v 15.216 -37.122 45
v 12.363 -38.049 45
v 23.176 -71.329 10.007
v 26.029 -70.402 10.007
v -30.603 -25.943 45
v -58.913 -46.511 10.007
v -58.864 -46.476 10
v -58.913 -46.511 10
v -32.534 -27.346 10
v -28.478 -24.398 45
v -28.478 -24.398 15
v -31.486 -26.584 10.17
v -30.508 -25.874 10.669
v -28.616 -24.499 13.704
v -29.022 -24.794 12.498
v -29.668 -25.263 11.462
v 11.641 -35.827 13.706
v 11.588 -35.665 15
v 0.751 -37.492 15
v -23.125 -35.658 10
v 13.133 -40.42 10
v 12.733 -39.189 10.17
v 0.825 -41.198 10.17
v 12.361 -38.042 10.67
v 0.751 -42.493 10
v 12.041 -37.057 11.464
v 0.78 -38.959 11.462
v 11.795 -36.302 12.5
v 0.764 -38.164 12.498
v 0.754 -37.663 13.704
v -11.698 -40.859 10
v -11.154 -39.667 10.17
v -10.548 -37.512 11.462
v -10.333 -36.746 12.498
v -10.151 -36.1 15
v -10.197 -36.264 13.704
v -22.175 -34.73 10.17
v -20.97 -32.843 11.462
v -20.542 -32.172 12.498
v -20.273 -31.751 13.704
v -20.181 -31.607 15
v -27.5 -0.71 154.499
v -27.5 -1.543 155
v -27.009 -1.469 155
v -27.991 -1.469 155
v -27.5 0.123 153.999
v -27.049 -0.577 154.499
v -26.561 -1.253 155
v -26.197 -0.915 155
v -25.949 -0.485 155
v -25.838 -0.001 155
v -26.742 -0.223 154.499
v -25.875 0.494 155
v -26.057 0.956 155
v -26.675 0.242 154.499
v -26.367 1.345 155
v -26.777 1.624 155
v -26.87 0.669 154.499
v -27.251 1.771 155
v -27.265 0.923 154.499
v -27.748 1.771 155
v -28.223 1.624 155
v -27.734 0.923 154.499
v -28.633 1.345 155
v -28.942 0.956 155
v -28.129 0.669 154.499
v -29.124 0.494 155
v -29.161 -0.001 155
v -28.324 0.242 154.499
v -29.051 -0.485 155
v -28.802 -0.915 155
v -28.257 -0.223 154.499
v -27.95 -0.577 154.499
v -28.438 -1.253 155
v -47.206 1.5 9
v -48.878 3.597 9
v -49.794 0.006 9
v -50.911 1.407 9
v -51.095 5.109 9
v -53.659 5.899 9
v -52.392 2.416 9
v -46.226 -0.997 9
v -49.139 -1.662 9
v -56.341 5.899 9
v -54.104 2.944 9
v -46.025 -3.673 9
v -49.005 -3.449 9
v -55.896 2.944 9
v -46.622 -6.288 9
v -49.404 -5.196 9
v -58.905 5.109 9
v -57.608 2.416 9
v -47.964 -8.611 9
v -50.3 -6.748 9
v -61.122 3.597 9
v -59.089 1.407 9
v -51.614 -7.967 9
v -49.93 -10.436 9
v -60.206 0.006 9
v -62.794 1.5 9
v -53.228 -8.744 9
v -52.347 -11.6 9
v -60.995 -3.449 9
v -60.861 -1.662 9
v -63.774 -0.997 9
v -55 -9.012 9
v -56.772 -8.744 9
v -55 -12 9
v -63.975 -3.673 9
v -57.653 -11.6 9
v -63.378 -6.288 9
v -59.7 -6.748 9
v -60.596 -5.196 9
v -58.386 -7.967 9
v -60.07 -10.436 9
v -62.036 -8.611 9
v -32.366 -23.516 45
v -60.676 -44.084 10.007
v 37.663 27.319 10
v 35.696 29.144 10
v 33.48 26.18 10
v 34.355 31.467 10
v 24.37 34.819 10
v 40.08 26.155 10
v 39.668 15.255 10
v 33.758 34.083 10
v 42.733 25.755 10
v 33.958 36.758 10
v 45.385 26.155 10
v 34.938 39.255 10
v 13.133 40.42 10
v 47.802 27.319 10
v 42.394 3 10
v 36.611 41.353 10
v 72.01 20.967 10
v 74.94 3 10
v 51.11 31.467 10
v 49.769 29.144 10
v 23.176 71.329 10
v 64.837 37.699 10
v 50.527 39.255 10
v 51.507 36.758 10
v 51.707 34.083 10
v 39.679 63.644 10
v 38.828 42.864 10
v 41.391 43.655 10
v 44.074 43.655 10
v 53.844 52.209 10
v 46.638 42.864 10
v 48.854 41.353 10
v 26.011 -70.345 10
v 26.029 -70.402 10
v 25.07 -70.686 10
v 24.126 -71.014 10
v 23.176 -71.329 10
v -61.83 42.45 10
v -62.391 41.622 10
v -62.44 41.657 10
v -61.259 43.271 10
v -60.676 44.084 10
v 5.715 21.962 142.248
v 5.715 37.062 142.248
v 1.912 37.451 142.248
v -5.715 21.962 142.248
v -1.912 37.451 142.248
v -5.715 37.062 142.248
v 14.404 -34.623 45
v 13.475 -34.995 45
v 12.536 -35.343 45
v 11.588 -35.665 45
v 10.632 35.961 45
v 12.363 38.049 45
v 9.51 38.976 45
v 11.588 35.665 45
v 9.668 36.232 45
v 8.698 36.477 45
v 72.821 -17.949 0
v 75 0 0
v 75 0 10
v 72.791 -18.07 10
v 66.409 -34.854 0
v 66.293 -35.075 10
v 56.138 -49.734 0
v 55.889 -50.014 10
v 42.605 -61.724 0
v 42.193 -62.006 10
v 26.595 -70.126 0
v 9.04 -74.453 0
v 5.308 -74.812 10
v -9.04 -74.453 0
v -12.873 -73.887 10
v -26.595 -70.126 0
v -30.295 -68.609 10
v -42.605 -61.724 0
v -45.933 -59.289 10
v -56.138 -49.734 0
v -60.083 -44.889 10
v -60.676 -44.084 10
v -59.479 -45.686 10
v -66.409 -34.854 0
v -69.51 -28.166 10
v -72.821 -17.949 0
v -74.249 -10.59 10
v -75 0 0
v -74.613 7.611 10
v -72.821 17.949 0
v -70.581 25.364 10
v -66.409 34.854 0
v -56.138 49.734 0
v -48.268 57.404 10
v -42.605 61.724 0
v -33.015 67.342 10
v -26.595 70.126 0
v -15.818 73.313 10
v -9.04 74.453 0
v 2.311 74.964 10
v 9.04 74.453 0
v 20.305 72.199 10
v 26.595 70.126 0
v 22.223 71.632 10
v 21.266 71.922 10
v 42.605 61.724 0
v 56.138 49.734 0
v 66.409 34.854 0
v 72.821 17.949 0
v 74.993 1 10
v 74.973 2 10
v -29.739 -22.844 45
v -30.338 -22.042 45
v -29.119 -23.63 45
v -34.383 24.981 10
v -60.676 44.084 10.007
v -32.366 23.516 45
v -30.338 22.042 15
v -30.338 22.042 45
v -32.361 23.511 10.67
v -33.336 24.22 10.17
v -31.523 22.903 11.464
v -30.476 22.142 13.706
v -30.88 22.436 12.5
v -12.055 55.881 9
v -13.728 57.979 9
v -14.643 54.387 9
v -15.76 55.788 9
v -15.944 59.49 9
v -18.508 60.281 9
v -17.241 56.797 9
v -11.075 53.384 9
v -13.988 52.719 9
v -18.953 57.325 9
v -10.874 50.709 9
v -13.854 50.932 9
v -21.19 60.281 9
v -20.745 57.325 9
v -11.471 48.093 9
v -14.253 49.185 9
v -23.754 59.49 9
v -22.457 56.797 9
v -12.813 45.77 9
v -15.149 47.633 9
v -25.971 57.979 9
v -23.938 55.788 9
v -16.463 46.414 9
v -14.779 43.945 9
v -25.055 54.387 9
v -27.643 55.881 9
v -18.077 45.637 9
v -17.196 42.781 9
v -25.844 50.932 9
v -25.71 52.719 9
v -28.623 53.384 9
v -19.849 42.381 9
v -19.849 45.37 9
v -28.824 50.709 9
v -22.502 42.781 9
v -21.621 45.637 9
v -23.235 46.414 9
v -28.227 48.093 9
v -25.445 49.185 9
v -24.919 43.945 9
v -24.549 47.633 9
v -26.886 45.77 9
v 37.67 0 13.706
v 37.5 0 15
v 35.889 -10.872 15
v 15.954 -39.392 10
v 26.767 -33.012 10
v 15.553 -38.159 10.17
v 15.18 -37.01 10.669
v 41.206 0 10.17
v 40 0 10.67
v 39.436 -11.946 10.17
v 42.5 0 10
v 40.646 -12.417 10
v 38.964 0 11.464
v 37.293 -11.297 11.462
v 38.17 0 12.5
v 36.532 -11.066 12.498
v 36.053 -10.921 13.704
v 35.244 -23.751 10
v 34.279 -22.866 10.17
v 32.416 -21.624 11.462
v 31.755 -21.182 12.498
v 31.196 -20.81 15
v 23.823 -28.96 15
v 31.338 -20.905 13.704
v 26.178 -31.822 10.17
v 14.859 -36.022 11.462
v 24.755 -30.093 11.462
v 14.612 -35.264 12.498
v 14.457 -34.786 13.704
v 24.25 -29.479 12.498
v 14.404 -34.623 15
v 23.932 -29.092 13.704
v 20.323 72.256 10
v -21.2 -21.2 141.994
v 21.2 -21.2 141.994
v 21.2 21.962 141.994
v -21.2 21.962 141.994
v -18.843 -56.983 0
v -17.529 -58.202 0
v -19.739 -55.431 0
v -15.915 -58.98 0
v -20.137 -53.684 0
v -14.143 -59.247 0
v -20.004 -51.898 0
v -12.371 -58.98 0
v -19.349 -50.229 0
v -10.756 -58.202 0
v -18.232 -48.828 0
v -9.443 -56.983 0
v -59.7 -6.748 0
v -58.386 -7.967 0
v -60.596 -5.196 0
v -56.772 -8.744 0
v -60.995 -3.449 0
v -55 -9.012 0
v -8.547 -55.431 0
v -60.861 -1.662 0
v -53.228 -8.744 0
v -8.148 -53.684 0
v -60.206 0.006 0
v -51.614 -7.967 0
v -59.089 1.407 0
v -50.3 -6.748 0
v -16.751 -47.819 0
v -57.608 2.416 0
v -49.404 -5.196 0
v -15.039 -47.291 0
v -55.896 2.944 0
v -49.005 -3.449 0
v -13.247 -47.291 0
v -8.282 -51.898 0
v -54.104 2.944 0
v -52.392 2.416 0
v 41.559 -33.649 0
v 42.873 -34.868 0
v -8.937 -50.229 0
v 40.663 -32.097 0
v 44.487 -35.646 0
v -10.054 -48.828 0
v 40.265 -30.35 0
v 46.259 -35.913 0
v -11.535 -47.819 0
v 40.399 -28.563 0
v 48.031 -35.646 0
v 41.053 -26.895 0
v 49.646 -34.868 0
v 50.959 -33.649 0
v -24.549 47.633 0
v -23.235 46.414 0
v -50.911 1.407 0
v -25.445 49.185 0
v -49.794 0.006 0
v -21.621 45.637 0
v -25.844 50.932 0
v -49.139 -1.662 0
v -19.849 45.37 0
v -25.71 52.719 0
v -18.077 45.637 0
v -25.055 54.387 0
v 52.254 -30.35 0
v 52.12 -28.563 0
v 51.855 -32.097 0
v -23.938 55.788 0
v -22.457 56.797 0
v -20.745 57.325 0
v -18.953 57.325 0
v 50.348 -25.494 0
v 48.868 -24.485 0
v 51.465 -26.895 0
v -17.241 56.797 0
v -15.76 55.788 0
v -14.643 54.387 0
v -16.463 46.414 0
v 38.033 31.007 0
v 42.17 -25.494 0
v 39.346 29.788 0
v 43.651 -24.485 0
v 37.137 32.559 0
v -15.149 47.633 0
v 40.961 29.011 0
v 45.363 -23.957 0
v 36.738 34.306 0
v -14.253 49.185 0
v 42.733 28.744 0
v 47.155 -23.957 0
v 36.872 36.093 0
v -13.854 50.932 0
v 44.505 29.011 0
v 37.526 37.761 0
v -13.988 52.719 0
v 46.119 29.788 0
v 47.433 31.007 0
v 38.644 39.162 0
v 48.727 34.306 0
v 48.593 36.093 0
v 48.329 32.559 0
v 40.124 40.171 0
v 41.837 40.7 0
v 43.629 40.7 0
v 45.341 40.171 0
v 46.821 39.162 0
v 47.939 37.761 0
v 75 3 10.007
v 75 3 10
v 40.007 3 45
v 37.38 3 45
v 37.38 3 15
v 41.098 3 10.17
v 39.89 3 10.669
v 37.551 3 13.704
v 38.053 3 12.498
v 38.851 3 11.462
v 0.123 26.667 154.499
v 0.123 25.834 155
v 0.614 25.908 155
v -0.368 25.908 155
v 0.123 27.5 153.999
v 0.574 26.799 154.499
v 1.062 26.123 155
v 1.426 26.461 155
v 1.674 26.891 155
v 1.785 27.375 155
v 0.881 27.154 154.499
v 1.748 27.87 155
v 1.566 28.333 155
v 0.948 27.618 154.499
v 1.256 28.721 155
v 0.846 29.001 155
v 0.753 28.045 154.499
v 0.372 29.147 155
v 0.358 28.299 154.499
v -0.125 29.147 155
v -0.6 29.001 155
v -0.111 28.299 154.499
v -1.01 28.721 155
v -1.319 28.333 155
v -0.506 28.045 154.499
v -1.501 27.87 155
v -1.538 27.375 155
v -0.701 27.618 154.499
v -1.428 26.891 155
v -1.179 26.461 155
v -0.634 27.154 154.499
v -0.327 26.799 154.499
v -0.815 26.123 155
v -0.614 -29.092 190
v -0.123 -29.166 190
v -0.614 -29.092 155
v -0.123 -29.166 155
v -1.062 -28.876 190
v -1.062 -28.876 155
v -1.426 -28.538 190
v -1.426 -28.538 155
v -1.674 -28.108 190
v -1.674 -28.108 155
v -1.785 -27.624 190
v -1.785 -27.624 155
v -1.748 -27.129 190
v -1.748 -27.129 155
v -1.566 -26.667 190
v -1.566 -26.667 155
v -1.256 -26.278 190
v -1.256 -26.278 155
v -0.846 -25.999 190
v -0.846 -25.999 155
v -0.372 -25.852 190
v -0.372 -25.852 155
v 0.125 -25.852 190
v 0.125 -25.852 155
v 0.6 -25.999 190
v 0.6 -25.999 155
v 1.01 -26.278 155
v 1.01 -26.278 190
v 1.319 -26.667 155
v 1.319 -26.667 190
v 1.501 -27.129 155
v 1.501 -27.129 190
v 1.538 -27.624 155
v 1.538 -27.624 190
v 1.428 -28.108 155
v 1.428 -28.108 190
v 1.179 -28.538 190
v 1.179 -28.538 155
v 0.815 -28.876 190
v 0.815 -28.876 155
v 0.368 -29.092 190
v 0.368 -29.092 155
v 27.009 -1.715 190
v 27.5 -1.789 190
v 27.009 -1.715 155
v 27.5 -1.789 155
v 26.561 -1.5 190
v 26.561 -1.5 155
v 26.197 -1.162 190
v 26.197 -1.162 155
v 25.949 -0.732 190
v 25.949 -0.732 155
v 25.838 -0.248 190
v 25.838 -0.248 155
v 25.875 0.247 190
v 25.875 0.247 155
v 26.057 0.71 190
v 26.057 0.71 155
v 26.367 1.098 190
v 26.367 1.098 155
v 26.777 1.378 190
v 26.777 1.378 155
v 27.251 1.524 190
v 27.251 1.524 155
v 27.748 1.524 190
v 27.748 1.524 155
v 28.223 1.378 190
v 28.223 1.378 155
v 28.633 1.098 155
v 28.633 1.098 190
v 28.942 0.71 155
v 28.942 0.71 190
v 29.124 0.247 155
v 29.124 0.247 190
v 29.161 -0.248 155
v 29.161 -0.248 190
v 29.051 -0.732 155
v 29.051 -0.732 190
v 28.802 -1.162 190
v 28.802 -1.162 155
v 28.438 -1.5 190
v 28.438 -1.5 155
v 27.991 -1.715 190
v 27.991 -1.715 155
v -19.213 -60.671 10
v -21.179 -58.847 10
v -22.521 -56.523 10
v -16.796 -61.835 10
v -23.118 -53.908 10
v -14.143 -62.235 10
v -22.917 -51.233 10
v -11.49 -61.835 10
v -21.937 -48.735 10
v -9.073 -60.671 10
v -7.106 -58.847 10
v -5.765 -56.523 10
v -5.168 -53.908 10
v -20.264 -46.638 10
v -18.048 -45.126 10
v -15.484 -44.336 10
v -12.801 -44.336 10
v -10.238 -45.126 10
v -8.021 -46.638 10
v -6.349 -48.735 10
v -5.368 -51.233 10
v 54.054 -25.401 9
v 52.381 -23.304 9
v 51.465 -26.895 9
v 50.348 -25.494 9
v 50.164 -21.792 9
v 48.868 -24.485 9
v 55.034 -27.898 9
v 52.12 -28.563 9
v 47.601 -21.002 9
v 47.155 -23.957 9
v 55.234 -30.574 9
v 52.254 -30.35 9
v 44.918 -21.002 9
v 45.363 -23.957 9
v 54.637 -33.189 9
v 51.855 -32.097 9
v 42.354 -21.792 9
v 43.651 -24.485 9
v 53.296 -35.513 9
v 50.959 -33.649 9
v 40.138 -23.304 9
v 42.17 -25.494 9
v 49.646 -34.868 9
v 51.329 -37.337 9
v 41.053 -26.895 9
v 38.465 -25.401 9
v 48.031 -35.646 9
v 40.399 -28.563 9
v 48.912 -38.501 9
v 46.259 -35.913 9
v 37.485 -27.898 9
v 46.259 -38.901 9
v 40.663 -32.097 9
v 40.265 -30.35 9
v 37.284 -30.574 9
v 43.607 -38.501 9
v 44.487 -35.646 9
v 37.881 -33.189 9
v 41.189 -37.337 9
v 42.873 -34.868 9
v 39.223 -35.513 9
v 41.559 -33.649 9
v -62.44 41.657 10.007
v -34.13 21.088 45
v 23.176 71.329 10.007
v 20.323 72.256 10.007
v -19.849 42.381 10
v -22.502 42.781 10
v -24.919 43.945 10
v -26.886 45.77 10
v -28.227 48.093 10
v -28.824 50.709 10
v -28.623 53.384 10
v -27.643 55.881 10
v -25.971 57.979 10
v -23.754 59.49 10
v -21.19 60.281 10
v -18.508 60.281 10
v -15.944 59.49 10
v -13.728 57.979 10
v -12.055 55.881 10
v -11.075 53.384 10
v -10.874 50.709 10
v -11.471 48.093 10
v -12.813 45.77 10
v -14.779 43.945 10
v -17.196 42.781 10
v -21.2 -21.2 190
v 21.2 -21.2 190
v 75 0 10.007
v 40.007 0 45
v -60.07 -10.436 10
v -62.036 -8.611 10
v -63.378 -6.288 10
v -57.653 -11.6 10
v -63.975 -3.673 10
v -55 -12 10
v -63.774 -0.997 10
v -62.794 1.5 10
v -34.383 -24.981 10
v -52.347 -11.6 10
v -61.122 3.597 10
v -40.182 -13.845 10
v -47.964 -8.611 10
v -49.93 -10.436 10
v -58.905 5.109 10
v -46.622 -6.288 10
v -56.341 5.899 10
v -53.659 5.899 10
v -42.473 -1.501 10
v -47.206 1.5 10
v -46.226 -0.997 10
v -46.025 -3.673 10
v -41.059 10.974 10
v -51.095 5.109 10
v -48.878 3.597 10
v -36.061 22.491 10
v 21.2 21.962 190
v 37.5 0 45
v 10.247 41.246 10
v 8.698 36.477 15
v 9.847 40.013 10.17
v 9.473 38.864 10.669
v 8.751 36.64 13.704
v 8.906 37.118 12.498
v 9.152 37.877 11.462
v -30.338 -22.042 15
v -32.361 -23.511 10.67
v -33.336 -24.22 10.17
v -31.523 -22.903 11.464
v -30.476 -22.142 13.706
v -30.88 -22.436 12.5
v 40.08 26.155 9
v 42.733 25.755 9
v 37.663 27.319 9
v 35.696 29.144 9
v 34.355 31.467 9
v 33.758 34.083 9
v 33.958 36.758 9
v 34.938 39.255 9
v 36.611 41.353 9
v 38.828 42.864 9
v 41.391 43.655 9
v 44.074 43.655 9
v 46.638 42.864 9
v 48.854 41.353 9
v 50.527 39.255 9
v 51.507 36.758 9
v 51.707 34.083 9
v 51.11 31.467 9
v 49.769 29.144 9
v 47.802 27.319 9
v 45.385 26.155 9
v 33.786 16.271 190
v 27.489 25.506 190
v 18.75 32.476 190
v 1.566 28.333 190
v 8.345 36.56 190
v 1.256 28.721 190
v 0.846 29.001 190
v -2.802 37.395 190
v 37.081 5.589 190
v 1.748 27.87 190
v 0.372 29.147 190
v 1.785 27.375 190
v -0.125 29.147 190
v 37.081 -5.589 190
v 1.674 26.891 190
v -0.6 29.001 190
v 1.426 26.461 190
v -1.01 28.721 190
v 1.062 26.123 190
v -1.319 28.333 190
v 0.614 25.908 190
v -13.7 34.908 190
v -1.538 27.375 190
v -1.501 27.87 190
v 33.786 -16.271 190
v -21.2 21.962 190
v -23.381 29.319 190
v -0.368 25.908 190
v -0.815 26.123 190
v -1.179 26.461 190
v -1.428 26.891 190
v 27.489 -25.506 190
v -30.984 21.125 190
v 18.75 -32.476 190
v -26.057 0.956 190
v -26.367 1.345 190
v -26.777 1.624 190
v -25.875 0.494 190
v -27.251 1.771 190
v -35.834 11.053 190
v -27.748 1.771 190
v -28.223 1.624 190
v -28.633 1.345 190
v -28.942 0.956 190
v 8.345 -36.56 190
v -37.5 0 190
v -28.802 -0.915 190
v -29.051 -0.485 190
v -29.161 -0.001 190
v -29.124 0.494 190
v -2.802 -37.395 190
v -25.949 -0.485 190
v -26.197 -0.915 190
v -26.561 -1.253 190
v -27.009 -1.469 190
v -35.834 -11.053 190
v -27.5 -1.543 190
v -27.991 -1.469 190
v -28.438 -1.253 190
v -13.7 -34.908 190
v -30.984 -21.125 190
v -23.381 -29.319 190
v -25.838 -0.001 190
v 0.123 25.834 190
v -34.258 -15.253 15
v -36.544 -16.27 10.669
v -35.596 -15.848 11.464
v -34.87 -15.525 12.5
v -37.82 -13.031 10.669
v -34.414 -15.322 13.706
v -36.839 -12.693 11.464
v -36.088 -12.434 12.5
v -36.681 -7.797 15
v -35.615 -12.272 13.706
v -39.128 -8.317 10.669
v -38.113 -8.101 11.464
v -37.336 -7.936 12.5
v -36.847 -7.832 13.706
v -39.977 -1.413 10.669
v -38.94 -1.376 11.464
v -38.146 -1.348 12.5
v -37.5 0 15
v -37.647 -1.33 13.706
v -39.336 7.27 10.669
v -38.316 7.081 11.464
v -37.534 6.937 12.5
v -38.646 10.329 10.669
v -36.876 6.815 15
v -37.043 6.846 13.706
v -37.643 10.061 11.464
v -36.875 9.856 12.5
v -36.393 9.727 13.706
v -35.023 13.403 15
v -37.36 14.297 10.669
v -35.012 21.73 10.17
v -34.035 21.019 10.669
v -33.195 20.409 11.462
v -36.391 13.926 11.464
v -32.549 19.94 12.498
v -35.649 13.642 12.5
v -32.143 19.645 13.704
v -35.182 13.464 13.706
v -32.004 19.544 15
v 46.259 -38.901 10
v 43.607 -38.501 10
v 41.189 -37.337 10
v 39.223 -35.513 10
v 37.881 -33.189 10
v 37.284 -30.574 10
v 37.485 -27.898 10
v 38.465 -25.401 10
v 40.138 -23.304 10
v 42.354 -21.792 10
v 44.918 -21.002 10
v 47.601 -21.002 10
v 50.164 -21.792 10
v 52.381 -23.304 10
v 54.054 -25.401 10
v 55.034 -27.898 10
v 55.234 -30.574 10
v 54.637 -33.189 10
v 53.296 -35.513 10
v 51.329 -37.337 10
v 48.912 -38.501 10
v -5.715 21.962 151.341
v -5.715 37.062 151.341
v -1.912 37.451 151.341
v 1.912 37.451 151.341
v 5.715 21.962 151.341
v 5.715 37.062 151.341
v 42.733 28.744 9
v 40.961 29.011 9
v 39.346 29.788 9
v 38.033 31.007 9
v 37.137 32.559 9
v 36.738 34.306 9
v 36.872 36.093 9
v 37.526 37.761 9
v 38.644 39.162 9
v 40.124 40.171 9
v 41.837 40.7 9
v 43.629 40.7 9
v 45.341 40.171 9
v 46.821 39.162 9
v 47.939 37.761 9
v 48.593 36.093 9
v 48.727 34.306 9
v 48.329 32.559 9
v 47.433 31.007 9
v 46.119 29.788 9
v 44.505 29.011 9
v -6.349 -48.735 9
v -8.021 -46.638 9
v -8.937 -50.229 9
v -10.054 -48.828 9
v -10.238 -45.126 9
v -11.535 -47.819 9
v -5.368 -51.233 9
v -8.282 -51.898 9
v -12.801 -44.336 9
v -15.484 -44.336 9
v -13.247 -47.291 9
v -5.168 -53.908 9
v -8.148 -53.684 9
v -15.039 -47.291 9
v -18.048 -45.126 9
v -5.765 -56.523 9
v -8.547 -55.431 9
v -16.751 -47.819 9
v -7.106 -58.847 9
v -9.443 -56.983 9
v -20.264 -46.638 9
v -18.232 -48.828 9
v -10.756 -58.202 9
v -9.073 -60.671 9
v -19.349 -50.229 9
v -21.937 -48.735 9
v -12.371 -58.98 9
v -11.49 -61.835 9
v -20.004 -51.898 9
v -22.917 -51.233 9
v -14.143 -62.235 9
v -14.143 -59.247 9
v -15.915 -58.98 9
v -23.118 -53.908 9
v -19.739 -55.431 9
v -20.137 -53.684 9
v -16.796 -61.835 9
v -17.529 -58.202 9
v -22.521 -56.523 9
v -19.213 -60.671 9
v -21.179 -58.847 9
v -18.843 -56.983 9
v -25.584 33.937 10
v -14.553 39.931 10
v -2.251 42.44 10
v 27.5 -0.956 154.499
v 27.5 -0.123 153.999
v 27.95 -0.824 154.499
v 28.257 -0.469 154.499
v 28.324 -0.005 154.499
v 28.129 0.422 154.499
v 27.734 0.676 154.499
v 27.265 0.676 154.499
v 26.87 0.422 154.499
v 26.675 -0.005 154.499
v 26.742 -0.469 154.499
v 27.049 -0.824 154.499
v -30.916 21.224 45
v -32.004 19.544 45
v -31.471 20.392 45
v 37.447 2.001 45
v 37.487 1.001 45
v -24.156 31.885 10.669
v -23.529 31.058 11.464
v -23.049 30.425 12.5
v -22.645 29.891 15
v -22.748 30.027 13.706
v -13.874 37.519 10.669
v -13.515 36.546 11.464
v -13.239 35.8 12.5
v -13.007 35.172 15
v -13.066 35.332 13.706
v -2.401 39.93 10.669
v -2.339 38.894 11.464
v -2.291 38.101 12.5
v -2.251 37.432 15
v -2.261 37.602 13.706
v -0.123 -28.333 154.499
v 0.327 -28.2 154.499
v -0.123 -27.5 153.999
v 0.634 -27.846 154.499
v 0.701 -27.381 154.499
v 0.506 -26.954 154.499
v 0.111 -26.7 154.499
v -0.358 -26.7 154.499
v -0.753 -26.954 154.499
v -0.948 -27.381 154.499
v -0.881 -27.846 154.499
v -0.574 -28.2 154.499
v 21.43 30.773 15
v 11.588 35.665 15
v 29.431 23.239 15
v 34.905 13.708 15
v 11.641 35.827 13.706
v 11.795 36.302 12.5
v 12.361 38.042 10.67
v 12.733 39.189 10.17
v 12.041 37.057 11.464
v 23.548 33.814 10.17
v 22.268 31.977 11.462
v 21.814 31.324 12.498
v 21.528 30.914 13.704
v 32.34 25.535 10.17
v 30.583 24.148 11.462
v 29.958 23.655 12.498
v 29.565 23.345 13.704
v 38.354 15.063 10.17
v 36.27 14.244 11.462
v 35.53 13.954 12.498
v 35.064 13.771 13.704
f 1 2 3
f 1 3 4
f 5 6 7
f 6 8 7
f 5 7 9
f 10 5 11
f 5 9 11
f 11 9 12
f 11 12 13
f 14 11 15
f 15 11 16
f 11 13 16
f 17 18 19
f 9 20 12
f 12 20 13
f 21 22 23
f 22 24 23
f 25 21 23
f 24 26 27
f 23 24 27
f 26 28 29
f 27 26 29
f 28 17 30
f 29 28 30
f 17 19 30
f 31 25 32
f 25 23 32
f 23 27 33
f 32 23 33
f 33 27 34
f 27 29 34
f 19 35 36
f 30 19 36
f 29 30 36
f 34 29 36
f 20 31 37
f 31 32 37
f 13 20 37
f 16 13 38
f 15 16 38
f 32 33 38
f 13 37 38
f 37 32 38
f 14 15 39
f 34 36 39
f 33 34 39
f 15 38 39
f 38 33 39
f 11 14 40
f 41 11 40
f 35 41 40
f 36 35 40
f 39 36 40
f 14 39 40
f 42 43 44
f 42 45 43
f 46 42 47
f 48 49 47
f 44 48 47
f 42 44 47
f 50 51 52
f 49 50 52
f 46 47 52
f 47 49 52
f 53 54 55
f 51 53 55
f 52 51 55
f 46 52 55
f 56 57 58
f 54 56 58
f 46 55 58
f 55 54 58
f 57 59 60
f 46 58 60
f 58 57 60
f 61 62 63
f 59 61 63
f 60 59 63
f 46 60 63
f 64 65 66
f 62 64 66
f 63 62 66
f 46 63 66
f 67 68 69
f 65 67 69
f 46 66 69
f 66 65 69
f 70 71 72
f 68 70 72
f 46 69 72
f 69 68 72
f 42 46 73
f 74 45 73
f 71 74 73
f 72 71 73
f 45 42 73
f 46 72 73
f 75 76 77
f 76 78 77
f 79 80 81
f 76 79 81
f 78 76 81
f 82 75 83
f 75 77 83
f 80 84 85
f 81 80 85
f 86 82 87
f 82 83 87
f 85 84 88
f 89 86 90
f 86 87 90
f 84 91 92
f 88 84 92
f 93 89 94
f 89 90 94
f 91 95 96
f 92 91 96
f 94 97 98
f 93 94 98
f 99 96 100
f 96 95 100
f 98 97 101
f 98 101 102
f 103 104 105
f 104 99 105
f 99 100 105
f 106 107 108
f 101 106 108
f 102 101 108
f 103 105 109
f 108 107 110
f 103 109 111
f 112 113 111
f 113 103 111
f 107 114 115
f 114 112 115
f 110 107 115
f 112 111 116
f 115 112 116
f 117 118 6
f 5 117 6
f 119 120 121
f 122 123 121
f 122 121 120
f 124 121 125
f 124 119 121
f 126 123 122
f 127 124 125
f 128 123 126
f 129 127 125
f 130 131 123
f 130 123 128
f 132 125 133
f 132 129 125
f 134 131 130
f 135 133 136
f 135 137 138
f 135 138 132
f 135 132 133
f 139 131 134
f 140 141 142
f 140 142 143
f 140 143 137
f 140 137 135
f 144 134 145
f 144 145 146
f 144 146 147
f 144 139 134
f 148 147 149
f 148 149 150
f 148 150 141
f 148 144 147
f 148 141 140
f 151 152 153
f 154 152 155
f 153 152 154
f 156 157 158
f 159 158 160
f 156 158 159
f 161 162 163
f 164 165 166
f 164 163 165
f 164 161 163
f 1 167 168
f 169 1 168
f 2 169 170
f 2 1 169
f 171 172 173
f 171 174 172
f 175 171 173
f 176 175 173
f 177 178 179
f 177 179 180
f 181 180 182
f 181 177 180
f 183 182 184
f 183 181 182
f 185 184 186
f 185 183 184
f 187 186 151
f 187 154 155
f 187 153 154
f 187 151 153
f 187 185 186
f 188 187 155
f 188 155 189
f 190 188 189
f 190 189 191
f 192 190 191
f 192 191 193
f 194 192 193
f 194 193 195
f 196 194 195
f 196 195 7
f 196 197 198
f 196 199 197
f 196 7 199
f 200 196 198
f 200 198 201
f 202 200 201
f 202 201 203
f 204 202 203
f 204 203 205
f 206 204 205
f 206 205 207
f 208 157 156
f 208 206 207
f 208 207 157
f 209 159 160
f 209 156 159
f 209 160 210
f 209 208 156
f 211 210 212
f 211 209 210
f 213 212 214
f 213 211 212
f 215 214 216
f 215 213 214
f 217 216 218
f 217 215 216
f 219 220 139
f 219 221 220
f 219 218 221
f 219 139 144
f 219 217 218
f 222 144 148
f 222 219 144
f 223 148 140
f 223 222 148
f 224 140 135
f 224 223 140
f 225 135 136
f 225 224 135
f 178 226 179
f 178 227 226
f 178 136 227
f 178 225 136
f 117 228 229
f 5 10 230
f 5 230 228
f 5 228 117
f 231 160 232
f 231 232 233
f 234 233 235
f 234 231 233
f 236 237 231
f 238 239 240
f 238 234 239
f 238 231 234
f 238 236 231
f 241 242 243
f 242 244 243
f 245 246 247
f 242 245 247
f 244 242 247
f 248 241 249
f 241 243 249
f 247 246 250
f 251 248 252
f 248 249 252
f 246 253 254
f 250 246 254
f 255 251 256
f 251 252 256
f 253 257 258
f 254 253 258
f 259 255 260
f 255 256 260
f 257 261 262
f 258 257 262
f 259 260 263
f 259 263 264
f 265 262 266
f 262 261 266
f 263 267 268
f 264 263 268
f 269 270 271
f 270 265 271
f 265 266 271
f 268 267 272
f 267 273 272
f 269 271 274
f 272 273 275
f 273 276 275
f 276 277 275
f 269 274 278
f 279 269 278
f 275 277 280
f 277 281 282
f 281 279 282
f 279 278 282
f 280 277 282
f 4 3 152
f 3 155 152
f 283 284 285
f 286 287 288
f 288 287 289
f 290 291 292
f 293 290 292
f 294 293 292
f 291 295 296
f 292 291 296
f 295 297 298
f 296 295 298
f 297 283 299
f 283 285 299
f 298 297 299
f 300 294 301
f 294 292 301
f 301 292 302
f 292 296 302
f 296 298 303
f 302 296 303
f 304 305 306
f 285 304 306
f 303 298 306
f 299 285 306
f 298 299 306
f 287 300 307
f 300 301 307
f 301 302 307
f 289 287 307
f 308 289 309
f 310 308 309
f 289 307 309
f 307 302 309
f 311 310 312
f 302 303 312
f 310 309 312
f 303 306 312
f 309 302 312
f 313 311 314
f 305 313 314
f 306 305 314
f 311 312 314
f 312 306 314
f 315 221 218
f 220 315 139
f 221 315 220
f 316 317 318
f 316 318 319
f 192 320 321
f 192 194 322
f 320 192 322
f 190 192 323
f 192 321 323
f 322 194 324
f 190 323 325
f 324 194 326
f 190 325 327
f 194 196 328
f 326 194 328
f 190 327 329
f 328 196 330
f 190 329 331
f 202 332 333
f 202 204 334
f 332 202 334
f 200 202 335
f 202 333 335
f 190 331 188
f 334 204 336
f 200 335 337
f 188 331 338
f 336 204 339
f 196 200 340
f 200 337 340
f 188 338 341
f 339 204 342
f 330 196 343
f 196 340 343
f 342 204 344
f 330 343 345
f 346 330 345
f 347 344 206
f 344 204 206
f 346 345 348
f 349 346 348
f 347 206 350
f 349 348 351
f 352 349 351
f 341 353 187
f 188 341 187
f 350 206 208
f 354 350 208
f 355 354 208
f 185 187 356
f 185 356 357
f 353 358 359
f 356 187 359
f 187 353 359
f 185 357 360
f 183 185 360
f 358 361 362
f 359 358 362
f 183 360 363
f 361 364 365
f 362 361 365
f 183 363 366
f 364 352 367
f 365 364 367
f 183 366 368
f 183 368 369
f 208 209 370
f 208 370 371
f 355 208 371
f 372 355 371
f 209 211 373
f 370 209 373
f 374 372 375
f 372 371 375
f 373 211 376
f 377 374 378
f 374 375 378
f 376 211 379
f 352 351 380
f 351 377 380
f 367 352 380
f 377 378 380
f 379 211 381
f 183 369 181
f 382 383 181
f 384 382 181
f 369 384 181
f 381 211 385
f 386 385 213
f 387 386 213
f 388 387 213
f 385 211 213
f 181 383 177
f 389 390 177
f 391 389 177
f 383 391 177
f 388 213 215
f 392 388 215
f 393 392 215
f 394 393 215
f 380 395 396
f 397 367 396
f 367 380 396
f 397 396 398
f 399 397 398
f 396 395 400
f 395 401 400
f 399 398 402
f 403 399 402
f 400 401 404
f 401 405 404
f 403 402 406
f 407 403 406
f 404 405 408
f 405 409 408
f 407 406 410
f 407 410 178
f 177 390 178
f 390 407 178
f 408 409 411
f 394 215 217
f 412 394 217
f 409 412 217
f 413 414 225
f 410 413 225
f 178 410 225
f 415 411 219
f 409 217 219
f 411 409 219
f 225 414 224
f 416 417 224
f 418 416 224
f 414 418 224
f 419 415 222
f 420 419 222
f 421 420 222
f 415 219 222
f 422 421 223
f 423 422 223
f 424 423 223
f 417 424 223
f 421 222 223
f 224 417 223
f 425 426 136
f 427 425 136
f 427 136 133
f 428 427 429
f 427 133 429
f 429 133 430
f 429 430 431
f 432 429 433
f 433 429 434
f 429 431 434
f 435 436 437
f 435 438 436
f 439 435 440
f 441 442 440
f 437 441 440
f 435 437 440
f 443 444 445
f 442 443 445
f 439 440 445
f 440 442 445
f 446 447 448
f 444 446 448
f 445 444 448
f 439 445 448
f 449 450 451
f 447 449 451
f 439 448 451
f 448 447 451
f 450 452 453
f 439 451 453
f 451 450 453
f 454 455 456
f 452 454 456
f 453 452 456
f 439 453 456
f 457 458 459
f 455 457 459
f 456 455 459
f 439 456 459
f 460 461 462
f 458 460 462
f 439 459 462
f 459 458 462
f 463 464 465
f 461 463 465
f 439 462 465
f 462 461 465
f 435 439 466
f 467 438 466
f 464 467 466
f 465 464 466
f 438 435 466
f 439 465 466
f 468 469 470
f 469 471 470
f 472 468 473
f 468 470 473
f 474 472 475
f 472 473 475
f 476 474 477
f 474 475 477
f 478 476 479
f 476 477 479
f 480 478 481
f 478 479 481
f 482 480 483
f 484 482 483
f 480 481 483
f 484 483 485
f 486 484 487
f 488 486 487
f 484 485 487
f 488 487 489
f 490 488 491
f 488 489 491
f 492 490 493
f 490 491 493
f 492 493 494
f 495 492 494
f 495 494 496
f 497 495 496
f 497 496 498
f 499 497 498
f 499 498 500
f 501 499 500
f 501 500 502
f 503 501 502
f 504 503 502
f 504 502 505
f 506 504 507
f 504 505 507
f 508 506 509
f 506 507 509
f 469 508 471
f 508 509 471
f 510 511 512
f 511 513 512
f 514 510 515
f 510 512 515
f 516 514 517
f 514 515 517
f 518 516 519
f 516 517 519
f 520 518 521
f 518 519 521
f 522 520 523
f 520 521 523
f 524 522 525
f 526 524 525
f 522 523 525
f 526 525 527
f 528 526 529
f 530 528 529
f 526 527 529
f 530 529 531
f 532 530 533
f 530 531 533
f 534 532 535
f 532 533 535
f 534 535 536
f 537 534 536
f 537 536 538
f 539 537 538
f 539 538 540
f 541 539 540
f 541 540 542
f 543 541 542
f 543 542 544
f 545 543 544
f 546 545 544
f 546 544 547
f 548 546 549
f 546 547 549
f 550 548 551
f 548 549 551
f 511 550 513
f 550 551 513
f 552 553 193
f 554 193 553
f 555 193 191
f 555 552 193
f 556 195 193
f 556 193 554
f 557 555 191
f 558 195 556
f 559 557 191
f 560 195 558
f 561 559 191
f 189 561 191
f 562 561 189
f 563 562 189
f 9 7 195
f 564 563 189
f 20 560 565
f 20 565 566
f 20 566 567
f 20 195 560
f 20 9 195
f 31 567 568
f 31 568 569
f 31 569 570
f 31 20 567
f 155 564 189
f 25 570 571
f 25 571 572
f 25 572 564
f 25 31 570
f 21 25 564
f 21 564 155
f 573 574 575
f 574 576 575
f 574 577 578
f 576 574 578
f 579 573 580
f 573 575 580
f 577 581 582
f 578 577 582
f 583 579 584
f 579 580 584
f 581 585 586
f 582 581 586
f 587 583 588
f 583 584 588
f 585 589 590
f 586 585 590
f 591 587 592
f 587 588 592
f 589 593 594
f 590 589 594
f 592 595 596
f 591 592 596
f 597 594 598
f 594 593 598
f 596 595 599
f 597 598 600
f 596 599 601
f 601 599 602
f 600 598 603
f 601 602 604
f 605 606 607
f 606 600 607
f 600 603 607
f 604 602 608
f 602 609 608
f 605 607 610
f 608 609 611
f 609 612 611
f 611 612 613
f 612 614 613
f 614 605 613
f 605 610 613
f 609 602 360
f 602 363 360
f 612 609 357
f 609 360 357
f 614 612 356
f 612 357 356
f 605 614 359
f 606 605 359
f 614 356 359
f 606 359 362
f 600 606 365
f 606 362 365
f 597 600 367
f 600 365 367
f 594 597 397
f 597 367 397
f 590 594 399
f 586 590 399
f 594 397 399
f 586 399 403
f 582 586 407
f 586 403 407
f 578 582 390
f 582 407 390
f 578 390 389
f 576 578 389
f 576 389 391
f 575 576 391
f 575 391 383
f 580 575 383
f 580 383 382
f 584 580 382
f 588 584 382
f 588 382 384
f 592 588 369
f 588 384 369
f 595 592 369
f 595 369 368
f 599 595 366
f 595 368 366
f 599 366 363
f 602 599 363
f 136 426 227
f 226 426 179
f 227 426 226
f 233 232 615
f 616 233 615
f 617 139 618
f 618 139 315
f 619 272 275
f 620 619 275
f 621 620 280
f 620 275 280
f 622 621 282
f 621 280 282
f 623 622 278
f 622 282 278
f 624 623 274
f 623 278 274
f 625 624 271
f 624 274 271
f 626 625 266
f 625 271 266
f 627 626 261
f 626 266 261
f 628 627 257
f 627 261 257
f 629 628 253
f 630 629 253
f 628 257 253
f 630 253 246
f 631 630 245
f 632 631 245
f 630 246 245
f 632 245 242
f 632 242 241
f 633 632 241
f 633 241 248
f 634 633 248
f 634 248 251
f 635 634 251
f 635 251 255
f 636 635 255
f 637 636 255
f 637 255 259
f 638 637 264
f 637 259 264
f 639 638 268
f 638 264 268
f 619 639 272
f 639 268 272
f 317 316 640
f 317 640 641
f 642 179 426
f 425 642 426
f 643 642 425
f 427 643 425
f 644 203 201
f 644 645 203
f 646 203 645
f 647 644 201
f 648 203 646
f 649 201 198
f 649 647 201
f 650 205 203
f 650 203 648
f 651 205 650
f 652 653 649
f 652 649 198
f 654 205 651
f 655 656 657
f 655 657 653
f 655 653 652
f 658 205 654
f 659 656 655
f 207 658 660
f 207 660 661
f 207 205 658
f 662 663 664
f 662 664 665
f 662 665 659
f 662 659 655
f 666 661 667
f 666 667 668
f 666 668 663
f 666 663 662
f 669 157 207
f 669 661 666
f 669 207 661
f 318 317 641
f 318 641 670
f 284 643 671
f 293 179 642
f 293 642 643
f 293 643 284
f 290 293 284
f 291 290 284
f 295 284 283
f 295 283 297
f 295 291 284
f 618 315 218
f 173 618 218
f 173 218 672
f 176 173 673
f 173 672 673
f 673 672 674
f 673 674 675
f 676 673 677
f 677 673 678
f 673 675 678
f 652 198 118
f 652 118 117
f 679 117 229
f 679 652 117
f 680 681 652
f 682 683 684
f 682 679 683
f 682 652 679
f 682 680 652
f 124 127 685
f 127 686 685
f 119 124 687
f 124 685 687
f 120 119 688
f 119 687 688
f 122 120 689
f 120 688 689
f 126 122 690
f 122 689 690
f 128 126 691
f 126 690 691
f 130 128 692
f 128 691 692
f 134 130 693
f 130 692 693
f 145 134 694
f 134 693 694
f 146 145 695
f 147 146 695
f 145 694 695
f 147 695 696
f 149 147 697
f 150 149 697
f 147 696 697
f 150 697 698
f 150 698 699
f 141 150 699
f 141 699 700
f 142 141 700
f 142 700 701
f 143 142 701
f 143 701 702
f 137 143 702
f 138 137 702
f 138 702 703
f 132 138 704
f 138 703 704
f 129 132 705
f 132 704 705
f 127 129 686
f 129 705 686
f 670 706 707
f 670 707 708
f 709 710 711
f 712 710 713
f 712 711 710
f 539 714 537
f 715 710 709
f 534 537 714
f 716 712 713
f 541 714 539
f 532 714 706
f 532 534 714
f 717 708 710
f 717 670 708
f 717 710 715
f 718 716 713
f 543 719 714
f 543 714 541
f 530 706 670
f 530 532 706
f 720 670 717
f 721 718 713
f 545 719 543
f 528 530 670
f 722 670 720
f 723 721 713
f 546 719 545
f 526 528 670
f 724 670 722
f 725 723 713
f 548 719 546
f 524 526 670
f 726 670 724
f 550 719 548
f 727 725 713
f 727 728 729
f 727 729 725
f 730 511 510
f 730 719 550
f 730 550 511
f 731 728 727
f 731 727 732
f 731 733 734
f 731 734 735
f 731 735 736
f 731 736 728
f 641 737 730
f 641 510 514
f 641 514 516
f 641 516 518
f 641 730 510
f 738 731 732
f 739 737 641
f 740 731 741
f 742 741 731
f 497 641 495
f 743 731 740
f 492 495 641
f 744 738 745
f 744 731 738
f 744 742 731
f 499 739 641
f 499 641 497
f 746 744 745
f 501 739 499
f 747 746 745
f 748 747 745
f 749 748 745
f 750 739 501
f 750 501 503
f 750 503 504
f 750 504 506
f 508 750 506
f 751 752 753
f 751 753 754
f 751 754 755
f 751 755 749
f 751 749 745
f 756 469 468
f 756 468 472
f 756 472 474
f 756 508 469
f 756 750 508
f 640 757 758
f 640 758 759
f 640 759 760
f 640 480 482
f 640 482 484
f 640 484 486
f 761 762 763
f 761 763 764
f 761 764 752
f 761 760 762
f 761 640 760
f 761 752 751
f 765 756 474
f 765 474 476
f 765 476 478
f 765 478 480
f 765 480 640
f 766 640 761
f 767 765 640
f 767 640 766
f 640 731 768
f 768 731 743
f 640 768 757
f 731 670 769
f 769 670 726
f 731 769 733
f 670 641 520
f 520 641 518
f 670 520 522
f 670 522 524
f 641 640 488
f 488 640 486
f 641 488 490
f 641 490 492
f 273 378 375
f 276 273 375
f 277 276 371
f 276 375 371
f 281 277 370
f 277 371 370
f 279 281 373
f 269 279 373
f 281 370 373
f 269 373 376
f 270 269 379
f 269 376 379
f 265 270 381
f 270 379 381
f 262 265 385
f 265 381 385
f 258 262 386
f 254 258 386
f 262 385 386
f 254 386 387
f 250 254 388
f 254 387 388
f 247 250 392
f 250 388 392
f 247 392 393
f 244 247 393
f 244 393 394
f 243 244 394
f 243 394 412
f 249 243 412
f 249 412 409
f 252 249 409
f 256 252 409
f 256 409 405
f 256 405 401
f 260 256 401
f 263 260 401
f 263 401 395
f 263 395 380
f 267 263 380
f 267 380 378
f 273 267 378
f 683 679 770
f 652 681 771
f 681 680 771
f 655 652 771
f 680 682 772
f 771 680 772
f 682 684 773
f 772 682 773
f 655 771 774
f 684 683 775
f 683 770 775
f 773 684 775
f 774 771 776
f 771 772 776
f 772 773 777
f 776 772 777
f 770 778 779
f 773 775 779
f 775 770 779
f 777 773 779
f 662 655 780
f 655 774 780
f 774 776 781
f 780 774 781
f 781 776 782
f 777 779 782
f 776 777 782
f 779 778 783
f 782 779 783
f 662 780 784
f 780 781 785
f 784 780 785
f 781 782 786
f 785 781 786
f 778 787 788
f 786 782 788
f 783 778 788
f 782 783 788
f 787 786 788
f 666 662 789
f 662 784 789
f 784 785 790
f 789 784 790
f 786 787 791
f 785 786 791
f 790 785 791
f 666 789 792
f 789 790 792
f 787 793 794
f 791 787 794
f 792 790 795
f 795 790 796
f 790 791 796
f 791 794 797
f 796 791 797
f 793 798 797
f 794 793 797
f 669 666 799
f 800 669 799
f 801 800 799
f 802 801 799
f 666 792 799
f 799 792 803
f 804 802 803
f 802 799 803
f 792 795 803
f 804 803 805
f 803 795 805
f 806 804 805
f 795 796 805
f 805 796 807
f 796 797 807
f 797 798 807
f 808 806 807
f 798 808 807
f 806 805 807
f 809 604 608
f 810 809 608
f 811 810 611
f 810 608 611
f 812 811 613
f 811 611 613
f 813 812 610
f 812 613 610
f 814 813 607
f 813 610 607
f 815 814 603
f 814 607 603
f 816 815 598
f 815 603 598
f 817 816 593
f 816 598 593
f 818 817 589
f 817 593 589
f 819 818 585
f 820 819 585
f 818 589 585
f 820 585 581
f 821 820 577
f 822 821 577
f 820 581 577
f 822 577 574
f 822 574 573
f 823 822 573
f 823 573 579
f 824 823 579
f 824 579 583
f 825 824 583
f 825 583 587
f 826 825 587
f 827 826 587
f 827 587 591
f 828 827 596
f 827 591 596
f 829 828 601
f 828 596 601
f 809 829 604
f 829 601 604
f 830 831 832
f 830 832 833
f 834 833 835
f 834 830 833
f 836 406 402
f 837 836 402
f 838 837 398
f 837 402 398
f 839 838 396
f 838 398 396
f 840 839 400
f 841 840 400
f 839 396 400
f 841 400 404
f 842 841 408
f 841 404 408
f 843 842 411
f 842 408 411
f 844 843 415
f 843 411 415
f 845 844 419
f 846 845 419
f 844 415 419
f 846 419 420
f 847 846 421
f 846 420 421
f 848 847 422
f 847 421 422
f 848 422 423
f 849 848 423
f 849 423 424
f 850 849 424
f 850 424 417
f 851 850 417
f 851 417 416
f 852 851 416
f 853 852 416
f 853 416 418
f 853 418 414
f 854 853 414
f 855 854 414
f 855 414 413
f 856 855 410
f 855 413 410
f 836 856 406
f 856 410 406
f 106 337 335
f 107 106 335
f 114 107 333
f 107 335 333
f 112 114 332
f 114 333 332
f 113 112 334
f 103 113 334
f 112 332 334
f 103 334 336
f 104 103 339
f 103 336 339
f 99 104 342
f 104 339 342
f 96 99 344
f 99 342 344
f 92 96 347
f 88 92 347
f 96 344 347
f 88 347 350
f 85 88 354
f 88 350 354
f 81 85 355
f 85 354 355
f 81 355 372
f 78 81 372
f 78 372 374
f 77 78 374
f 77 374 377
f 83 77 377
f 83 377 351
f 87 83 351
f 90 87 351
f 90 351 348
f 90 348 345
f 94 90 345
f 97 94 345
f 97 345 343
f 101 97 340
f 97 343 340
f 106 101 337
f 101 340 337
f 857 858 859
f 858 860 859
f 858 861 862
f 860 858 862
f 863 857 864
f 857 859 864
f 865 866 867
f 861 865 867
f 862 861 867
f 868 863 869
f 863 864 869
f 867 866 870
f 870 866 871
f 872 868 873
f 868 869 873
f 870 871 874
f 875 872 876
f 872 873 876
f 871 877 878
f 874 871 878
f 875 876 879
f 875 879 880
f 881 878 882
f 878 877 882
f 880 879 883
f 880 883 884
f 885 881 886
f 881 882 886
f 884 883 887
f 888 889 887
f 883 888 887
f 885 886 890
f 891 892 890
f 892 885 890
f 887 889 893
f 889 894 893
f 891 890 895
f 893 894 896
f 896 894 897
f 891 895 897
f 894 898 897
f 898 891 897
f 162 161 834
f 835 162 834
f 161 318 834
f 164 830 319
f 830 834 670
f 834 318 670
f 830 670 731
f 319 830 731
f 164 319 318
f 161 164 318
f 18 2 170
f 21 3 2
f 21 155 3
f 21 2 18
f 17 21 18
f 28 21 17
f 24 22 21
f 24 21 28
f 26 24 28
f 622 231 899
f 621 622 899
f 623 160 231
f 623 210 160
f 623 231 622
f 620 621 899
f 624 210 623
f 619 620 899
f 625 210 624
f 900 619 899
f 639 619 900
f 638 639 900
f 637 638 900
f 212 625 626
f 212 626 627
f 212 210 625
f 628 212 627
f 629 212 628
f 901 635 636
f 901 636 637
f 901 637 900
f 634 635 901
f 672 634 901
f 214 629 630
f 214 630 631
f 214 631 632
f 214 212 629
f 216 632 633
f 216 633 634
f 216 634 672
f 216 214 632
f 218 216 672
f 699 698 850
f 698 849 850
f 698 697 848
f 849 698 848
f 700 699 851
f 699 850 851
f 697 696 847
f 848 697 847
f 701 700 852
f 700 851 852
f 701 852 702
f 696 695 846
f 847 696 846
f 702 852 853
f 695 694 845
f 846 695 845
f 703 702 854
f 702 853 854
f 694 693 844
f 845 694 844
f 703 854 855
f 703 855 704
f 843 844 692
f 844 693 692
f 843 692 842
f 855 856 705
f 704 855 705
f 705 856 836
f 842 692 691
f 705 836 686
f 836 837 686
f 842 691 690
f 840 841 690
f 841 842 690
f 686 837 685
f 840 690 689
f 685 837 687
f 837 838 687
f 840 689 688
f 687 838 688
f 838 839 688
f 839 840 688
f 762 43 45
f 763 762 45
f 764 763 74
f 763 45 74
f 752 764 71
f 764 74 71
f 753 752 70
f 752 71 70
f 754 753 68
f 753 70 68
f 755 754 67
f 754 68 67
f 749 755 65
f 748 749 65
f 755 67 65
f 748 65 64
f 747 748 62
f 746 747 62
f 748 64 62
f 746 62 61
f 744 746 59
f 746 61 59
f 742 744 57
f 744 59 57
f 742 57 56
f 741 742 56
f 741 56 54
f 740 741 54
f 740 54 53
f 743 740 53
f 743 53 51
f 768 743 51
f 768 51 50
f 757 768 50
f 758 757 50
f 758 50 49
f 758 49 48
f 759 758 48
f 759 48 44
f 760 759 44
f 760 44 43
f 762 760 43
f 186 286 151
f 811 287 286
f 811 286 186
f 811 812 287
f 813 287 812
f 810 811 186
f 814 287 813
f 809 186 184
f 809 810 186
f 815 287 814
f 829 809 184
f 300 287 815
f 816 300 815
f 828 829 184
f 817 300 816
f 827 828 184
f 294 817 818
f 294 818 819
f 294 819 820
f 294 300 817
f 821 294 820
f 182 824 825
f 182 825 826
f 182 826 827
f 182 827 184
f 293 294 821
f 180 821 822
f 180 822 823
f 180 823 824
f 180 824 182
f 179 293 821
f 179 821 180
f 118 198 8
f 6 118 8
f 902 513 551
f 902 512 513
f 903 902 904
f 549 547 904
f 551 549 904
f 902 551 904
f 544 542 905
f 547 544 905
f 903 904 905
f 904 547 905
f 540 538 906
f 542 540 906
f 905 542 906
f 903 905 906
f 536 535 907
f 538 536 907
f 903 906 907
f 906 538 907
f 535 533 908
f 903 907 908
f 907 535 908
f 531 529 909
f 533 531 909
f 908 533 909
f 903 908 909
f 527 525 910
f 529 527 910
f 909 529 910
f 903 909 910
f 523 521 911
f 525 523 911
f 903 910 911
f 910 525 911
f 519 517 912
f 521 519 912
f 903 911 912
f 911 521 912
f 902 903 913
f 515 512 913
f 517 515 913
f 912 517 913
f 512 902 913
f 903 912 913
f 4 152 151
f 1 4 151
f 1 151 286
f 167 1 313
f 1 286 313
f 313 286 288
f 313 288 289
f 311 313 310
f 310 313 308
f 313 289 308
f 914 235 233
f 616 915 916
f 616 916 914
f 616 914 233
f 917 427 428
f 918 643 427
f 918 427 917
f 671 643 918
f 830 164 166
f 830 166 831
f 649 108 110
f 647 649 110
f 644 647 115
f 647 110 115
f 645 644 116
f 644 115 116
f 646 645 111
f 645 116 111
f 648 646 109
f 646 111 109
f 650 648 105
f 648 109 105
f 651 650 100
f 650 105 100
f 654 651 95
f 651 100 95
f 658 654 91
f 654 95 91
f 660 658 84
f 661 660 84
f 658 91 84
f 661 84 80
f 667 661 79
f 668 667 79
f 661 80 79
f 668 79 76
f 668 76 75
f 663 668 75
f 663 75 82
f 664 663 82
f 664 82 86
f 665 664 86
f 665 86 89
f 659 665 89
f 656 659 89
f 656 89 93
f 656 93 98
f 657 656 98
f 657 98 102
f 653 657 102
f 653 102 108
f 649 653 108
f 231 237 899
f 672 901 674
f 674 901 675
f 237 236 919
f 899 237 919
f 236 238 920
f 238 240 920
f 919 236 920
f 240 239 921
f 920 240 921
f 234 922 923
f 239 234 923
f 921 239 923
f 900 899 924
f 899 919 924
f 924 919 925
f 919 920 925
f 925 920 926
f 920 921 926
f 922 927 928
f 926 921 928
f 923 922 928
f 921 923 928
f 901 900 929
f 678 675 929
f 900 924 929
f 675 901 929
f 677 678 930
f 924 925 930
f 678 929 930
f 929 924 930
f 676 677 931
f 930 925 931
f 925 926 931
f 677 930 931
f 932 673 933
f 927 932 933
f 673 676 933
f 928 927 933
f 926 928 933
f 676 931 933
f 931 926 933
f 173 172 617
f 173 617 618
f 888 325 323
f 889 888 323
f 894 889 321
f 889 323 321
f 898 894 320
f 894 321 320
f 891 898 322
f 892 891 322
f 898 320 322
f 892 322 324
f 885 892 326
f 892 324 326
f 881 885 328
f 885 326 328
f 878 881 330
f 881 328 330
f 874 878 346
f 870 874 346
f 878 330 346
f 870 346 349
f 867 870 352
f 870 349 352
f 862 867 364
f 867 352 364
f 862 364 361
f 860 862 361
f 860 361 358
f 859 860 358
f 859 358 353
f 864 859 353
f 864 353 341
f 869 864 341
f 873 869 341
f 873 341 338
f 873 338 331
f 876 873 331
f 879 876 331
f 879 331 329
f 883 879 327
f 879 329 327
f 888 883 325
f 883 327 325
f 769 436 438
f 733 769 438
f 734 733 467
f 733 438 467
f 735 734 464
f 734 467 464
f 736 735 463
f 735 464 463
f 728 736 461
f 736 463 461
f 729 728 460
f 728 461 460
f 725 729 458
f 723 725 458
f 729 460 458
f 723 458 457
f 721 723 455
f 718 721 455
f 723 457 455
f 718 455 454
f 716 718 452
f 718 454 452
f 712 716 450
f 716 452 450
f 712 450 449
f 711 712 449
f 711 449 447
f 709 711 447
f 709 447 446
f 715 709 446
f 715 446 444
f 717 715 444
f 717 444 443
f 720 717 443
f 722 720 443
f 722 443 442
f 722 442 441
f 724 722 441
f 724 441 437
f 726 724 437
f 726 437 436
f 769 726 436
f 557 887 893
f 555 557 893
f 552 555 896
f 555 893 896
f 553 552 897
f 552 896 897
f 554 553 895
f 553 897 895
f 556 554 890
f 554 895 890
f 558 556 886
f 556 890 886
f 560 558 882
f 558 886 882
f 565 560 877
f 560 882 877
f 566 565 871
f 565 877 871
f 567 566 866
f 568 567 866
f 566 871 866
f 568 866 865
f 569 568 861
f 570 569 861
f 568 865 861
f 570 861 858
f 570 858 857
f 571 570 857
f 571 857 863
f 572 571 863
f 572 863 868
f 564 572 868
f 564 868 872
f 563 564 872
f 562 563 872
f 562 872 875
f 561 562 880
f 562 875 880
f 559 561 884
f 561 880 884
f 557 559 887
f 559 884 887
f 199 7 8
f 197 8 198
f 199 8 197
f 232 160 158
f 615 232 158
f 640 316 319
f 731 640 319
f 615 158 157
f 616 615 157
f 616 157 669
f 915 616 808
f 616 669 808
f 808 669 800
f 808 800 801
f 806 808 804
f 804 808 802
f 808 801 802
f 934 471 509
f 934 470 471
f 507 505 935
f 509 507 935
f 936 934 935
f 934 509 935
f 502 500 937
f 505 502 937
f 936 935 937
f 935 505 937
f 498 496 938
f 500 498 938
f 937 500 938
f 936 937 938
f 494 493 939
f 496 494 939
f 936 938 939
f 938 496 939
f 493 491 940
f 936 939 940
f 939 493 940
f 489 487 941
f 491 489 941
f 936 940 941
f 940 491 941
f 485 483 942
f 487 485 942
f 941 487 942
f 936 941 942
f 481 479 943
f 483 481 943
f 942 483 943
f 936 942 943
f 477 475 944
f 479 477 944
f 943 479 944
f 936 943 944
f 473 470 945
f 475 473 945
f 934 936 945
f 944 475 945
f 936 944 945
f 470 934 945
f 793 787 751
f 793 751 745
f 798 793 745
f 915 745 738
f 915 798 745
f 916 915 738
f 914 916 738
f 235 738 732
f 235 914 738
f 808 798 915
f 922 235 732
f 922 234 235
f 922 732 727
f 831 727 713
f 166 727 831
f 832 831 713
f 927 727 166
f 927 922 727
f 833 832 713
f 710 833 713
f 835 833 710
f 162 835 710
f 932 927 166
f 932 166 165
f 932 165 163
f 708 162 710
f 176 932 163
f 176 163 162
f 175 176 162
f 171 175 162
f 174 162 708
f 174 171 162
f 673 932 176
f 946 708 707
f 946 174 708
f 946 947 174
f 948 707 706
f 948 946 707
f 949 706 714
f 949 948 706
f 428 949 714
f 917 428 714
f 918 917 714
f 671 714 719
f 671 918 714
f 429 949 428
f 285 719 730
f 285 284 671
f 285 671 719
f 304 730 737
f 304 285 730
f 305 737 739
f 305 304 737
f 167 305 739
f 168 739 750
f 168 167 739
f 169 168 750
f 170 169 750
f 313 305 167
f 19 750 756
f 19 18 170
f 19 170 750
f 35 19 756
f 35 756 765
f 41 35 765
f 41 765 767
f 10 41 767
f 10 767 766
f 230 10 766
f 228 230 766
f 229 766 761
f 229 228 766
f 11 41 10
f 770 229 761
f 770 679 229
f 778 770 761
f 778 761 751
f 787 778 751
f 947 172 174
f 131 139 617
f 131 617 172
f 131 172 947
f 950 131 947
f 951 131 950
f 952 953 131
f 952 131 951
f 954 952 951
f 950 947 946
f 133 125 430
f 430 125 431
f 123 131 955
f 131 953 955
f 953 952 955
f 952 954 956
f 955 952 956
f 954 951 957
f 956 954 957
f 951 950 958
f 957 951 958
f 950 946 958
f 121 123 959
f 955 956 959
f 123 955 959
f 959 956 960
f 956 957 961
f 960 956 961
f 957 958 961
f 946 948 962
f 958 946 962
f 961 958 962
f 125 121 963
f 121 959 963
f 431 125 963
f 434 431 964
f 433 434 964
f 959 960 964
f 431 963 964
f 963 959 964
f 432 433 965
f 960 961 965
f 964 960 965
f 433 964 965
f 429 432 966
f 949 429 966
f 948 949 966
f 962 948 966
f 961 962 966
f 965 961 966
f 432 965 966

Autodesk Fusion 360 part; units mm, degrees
sketch "Sketch1" plane through (0, 0, 0) normal (0, 0, 1) x (1, 0, 0)
  circle A0 centre (0, 0) radius 75
  dimension "d1" = 150
extrude "Extrude1" add sketch "Sketch1" along normal blind 10 makes body 1
sketch "Sketch2" plane through (0, 0, 10) normal (0, 0, 1) x (-1, 0, 0)
  circle A0 centre (0, 0) radius 75
sketch "Sketch3" plane through (0, 0, 10) normal (0, 0, 1) x (-1, 0, 0)
  circle A0 centre (0, 0) radius 37.5
  dimension "d4" = 75
extrude "Extrude2" add sketch "Sketch3" along normal blind 200 bodies 1
sketch "Sketch4" plane through (0, 0, 10) normal (0, 0, 1) x (-1, 0, 0)
  circle A0 centre (0, 0) radius 37.5
  line L0 (60.6763, 44.0839) -> (28.3156, 20.5725)
  line L1 (-23.1763, 71.3292) -> (-10.8156, 33.287)
  line L2 (-75, 0) -> (-35, 0)
  line L3 (-23.1763, -71.3292) -> (-10.8156, -33.287)
  line L4 (60.6763, -44.0839) -> (28.3156, -20.5725)
  line L5 (75, 0) -> (55, 0)
  line L6 (75, 0) -> (55, 0)
  line L7 (23.1763, 71.3292) -> (16.9959, 52.3081)
  line L8 (-60.6763, 44.0839) -> (-44.4959, 32.3282)
  line L9 (-60.6763, -44.0839) -> (-44.4959, -32.3282)
  line L10 (23.1763, -71.3292) -> (16.9959, -52.3081)
  line L11 (-10.8156, 33.287) -> (-23.1763, 71.3292)
  line L12 (-23.1763, 71.3292) -> (-26.0294, 70.4022)
  line L13 (-26.0294, 70.4022) -> (-13.6688, 32.3599)
  line L14 (-13.6688, 32.3599) -> (-10.8156, 33.287)
  line L15 (-75, 0) -> (-75, -3)
  line L16 (-35, -3) -> (-35, 0)
  line L17 (-75, -3) -> (-35, -3)
  line L18 (-23.1763, -71.3292) -> (-20.3231, -72.2563)
  line L19 (-7.9624, -34.214) -> (-10.8156, -33.287)
  line L20 (-20.3231, -72.2563) -> (-7.9624, -34.214)
  line L21 (60.6763, -44.0839) -> (62.4396, -41.6568)
  line L22 (30.079, -18.1454) -> (28.3156, -20.5725)
  line L23 (62.4396, -41.6568) -> (30.079, -18.1454)
  line L24 (60.6763, 44.0839) -> (58.9129, 46.5109)
  line L25 (26.5522, 22.9995) -> (28.3156, 20.5725)
  line L26 (58.9129, 46.5109) -> (26.5522, 22.9995)
  point P0 (75, 0)
  dimension "d9" = 20
  dimension "d11" = 360
  dimension "d12" = 3
  dimension "d14" = 360
extrude "Extrude3" add sketch "Sketch4" along normal blind 35 separate body contours A0 L0 L25 L26 | A0 L0 L24 L26 | A0 L4 L21 L23 | A0 L4 L22 L23 | A0 L1 L11 L13 L14 | A0 L1 L11 L12 L13 | A0 L3 L18 L20 | A0 L3 L19 L20 | A0 L2 L16 L17 | A0 L2 L15 L17 makes body 2 at (16.2029, 59.5755, 21.6667) makes body 3 at (19.056, -58.6485, 33.3333) makes body 4 at (-48.126, -38.6738, 33.3333) makes body 5 at (61.6667, 3, 33.3333) makes body 6 at (-49.8894, 36.2468, 33.3333)
sketch "Sketch5" plane through (0, 0, 10) normal (0, 0, 1) x (-1, 0, 0)
  line L0 (75, 3) -> (55, 3)
  line L1 (20.3231, 72.2563) -> (14.1428, 53.2352)
  line L2 (-62.4396, 41.6568) -> (-46.2593, 29.9011)
  line L3 (-58.9129, -46.5109) -> (-42.7326, -34.7552)
  line L4 (26.0294, -70.4022) -> (19.8491, -51.3811)
  point P0 (62.4396, -41.6568)
  point P1 (30.079, -18.1454)
  dimension "d19" = 20
  dimension "d21" = 360
hole "Hole1" at (-55, -3, 10) at (-14.1428, -53.2352, 10) at (-19.8491, 51.3811, 10) at (42.7326, 34.7552, 10) at (46.2593, -29.9011, 10) direction (0, 0, -1) diameter 12.023 depth 10 tip angle 118 counterbore diameter 18 counterbore depth 1 bodies 1
fillet "Fillet1" radius 5 1 edges at (34.9623, -13.5606, 10) on bodies 1
combine "Combine1" operation add target body 1 tool bodies 4 3 5 6 2
chamfer "Chamfer1" distance 35 distance2 35 5 edges at (75, 1.5, 45) (21.7497, 71.7928, 45) (-61.558, 42.8704, 45) (24.6029, -70.8657, 45) (-59.7946, -45.2974, 45) measured on face at (62.4955, 1.3337, 45) measured on face at (18.0438, 59.8489, 45) measured on face at (-51.3439, 35.655, 45) measured on face at (20.5806, -59.0247, 45) measured on face at (-49.7761, -37.8129, 45) on bodies 1
sketch "Sketch6" plane through (0, 0, 210) normal (0, 0, 1) x (-1, 0, 0)
  circle A0 centre (0, 0) radius 37.5
  line L0 (-21.209, 21.209) -> (21.209, 21.209)
  line L1 (21.209, 21.209) -> (21.209, -21.209)
  line L2 (21.209, -21.209) -> (-21.209, -21.209)
  line L3 (-21.209, -21.209) -> (-21.209, 21.209)
  line L4 (-21.209, 21.209) -> (21.209, -21.209) construction
  line L5 (21.209, 21.209) -> (-21.209, -21.209) construction
  dimension "d31" = 42.418
  dimension "d32" = 42.418
extrude "Extrude9" cut 1 faces at (-9.3028, -10.3652, 210) along direction (0, 0, -1) blind 20 on bodies 1 bodies 1
sketch "Sketch22" plane through (0, 0, 190) normal (0, 0, 1) x (-1, 0, 0)
  circle A0 centre (0, 0) radius 37.5
sketch "Sketch23" plane through (0, 0, 190) normal (0, 0, 1) x (-1, 0, 0)
  line L0 (-21.2, -21.2) -> (21.2, -21.2)
  line L1 (21.2, -21.2) -> (21.2, 21.2)
  line L2 (21.2, 21.2) -> (-21.2, 21.2)
  line L3 (-21.2, 21.2) -> (-21.2, -21.2)
  line L4 (-21.2, -21.2) -> (21.2, 21.2) construction
  line L5 (21.2, -21.2) -> (-21.2, 21.2) construction
  dimension "d103" = 42.4
  dimension "d104" = 42.4
extrude "Extrude10" cut sketch "Sketch23" against normal blind 48.006 bodies 1
sketch "Sketch24" plane through (0, 0, 190) normal (0, 0, 1) x (-1, 0, 0)
  line L0 (21.2, -21.2) -> (21.2, -21.962)
  line L1 (-21.2, -21.2) -> (-21.2, -21.962)
  line L2 (21.2, -21.2) -> (-21.2, -21.2)
  line L3 (-21.2, -21.962) -> (21.2, -21.962)
  point P0 (21.2, -21.2)
  point P1 (-21.2, -21.2)
  dimension "d107" = 0.762
  dimension "d108" = 0.762
extrude "Extrude11" cut sketch "Sketch24" against normal blind 48.006 bodies 1
sketch "Sketch26" plane through (0, 21.962, 0) normal (0, -1, 0) x (1, 0, 0)
  line L0 (21.2, 190) -> (-21.2, 190)
  line L1 (-21.2, 190) -> (-21.2, 141.994)
  line L2 (-21.2, 141.994) -> (21.2, 141.994)
  line L3 (21.2, 141.994) -> (21.2, 190)
  line L4 (0, 141.994) -> (0, 142.248)
  line L5 (0, 142.248) -> (5.715, 142.248)
  line L6 (0, 142.248) -> (-5.715, 142.248)
  line L7 (5.715, 142.248) -> (5.715, 151.341)
  line L8 (-5.715, 142.248) -> (-5.715, 151.341)
  line L9 (-5.715, 151.341) -> (5.715, 151.341)
  dimension "d111" = 0.254
  dimension "d112" = 5.715
  dimension "d113" = 5.715
  dimension "d114" = 9.093
  dimension "d115" = 9.093
extrude "Extrude12" cut sketch "Sketch26" against normal blind 55 contours L5 L6 L7 L8 L9 bodies 1
sketch "Sketch27" plane through (0, 0, 190) normal (0, 0, 1) x (-1, 0, 0)
  circle A0 centre (0, 0) radius 37.5
  line L0 (-0.1682, -37.4996) -> (-0.1233, -27.4997)
  line L1 (37.4996, -0.1682) -> (27.4997, -0.1233)
  line L2 (0.1682, 37.4996) -> (0.1233, 27.4997)
  line L3 (-37.4996, 0.1682) -> (-27.4997, 0.1233)
  dimension "d118" = 10
  dimension "d120" = 360
hole "Hole5" at (27.4997, -0.1233, 190) at (-0.1233, -27.4997, 190) at (0.1233, 27.4997, 190) at (-27.4997, 0.1233, 190) direction (0, 0, -1) diameter 3.332 depth 35 tip angle 118 bodies 1
